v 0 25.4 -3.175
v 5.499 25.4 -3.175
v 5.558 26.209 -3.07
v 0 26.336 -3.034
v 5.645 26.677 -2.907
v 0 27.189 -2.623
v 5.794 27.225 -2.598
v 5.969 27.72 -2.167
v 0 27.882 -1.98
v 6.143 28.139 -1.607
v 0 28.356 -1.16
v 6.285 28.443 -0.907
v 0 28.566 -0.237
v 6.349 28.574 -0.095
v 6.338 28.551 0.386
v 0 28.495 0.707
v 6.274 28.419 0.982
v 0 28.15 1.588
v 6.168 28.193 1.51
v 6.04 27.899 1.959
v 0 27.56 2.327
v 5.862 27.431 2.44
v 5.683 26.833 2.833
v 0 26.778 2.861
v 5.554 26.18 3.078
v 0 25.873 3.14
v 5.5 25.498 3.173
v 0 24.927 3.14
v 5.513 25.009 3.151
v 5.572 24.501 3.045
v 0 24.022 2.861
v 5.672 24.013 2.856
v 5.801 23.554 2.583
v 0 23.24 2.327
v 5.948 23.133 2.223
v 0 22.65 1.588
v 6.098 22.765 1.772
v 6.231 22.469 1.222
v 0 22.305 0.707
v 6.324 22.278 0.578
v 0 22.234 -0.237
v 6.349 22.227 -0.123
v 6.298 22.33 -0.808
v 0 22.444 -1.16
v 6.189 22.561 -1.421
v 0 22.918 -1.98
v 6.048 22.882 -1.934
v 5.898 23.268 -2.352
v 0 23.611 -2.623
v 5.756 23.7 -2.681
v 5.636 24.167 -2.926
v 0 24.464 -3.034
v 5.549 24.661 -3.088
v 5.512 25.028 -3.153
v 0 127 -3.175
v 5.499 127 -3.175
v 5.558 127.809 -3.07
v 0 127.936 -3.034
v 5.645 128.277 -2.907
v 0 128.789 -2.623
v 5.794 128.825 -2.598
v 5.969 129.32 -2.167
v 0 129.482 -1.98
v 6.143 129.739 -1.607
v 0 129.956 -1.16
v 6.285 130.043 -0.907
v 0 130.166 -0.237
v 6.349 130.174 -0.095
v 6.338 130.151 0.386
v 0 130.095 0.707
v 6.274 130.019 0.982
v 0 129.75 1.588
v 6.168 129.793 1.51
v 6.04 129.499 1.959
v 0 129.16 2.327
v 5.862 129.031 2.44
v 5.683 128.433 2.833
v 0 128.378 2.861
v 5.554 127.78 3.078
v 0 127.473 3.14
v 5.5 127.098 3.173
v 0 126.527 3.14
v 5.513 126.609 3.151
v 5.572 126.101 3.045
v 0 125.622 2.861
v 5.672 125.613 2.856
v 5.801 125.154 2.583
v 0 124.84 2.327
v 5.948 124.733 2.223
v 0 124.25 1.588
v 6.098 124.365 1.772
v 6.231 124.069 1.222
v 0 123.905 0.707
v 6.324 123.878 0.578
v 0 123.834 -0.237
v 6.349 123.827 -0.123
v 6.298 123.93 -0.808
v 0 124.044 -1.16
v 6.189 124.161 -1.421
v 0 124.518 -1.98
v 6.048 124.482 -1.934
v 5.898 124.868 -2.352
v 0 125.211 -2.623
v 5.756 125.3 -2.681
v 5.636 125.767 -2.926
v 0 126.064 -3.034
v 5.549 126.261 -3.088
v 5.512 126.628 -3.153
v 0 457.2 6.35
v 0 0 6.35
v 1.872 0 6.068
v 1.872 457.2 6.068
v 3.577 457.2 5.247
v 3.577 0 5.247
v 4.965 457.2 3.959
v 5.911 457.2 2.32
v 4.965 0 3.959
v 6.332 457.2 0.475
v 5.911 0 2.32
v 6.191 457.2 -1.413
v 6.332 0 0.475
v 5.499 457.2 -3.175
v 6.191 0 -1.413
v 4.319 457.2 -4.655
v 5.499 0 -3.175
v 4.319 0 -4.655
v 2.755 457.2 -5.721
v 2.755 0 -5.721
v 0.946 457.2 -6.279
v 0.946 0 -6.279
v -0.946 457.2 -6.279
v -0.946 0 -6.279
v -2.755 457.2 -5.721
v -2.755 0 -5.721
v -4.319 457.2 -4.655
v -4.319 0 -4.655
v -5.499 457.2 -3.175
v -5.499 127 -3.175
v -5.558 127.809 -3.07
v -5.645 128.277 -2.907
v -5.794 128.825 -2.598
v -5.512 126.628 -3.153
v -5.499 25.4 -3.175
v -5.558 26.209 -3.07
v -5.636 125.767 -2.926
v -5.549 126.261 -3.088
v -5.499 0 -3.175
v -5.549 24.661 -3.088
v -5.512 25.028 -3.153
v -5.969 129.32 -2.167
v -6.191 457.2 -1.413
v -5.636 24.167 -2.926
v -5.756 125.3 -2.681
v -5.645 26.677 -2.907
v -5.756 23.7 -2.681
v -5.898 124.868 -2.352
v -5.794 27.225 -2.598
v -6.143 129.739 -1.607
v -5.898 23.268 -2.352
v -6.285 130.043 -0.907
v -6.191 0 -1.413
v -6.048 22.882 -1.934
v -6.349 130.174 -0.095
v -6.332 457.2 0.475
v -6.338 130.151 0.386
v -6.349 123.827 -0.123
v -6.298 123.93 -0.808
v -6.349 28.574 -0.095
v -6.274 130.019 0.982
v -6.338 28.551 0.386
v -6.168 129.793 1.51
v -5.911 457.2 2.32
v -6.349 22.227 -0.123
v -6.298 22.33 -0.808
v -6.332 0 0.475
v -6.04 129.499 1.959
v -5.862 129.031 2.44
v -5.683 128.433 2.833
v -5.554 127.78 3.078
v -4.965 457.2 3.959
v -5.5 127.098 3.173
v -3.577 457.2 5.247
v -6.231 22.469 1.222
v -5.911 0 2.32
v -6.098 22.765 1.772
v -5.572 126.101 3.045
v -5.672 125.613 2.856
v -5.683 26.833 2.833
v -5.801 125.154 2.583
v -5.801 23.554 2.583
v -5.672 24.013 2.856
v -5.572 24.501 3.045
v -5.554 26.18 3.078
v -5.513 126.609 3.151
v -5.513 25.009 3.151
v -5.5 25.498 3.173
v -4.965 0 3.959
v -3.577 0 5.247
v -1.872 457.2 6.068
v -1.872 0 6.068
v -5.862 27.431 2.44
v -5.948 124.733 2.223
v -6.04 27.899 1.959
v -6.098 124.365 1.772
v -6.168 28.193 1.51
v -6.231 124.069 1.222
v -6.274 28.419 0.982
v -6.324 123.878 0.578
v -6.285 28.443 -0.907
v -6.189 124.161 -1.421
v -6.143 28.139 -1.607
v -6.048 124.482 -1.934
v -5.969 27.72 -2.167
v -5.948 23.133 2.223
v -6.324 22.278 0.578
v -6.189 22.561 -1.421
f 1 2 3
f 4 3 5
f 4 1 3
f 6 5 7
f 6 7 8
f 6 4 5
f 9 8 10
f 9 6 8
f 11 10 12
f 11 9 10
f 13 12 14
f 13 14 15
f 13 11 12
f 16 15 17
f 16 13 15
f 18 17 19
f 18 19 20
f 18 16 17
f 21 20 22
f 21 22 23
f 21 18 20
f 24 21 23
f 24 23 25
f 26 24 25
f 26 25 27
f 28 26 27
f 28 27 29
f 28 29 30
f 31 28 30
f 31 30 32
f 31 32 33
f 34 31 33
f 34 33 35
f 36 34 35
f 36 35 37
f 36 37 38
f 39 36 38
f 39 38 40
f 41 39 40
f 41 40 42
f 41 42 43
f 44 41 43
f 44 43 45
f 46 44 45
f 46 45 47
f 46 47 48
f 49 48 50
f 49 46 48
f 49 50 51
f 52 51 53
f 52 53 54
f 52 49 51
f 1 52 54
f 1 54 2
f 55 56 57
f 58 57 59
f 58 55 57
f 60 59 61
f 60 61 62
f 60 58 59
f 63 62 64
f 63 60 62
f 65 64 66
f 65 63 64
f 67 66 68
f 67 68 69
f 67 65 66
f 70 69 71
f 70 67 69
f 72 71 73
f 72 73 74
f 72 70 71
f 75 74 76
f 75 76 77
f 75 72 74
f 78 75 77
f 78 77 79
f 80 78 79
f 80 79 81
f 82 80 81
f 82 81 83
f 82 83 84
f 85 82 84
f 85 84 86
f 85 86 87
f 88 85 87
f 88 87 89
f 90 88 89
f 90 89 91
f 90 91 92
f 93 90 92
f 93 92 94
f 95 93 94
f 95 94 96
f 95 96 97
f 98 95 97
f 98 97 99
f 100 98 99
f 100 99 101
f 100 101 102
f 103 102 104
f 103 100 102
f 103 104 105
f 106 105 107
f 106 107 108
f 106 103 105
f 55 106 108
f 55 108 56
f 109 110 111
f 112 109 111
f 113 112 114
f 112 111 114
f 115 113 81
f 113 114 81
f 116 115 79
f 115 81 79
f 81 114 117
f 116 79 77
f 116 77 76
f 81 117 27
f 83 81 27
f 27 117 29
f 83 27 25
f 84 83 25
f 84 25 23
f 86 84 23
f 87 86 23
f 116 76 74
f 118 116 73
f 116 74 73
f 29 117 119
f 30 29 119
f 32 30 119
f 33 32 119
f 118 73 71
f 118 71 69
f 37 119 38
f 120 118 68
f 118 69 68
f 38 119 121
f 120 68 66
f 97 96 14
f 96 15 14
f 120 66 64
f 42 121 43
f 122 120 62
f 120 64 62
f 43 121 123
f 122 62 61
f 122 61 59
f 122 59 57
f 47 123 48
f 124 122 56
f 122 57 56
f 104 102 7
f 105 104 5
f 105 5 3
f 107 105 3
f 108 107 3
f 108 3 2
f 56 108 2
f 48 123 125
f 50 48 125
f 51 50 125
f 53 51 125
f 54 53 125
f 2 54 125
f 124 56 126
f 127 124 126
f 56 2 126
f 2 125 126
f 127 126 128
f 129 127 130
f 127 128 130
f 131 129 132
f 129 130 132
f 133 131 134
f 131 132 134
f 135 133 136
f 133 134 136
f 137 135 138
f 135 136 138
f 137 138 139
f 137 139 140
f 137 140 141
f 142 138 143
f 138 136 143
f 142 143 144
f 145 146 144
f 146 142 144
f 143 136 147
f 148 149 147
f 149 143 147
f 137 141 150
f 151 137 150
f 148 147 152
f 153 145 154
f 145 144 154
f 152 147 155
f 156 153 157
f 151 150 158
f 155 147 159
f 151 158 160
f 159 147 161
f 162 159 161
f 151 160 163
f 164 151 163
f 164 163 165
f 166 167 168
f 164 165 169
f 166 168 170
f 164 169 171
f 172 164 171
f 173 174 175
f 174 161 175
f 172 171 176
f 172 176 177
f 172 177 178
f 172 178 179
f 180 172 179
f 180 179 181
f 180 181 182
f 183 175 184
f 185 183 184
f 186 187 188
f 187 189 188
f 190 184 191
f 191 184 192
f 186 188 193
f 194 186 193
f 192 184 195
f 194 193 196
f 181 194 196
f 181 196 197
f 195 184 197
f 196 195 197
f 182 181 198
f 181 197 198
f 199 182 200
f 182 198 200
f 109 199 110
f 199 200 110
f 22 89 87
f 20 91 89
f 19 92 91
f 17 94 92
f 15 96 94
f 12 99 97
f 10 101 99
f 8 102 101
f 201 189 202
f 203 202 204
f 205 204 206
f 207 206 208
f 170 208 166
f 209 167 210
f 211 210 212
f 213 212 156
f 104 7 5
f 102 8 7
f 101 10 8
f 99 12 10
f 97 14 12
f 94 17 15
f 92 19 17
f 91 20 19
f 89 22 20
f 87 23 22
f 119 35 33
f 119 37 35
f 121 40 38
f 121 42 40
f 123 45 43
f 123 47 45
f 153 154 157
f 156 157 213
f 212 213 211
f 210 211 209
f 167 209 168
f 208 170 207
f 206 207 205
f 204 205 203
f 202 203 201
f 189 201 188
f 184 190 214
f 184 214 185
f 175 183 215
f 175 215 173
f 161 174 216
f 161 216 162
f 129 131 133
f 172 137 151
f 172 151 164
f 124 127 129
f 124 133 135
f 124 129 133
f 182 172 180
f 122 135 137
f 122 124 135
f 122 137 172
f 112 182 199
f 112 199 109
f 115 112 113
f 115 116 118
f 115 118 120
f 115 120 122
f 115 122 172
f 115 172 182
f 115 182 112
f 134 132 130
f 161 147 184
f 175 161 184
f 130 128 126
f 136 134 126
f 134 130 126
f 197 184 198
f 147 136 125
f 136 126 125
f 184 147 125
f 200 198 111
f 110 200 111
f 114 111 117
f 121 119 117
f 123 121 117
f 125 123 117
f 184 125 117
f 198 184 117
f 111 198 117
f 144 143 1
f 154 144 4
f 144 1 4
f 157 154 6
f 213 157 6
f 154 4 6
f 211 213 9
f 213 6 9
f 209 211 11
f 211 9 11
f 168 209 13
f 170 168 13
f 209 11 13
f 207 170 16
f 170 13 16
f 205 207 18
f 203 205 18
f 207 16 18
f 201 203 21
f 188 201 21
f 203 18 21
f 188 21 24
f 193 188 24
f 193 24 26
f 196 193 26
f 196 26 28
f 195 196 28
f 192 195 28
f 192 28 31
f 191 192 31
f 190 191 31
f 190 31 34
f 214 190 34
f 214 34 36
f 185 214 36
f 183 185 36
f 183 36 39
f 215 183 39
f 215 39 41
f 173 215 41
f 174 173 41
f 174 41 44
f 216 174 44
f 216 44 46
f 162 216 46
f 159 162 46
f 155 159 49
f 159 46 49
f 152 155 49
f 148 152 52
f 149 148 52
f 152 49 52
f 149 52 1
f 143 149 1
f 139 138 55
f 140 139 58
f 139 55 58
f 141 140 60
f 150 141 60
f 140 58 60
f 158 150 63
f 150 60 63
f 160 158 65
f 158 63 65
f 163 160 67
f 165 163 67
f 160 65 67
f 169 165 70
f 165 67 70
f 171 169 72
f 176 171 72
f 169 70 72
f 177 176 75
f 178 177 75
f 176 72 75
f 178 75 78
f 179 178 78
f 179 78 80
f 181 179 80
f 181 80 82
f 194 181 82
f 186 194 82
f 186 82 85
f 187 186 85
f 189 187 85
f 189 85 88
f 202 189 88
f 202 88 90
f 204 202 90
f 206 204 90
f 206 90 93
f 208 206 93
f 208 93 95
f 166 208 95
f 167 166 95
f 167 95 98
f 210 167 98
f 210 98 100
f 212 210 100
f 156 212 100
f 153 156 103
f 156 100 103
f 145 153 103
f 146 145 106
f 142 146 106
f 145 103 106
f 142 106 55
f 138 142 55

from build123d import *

# Parameters (mm, degrees)
SKETCH1_R               = 6.35
BOSS_EXTRUDE1_DEPTH     = 457.2
SKETCH2_R               = 3.175
CUT_EXTRUDE1_DEPTH      = 7.35
CUT_EXTRUDE1_DEPTH_BACK = 7.35


with BuildPart() as part:
    # Sketch1 → Boss-Extrude1 (new body)
    with BuildSketch(Plane(origin=(0, 0, 0), x_dir=(1, 0, 0), z_dir=(0, 1, 0))):
        with Locations(Location((0, 0, 0), (0, 0, 270))):  # turned: the seam where the file's is
            Circle(SKETCH1_R)
    extrude(amount=BOSS_EXTRUDE1_DEPTH)

    # Sketch2 → Cut-Extrude1 (cut, two sides)
    with BuildSketch(Plane(origin=(0, 0, 0), x_dir=(0, 0, -1), z_dir=(1, 0, 0))) as cut_extrude1_sk:
        with Locations((0, 25.4)):
            Circle(SKETCH2_R)
        with Locations((0, 127)):
            Circle(SKETCH2_R)
    extrude(amount=CUT_EXTRUDE1_DEPTH, mode=Mode.SUBTRACT)
    extrude(cut_extrude1_sk.sketch, amount=-CUT_EXTRUDE1_DEPTH_BACK, mode=Mode.SUBTRACT)


solid = part.part
